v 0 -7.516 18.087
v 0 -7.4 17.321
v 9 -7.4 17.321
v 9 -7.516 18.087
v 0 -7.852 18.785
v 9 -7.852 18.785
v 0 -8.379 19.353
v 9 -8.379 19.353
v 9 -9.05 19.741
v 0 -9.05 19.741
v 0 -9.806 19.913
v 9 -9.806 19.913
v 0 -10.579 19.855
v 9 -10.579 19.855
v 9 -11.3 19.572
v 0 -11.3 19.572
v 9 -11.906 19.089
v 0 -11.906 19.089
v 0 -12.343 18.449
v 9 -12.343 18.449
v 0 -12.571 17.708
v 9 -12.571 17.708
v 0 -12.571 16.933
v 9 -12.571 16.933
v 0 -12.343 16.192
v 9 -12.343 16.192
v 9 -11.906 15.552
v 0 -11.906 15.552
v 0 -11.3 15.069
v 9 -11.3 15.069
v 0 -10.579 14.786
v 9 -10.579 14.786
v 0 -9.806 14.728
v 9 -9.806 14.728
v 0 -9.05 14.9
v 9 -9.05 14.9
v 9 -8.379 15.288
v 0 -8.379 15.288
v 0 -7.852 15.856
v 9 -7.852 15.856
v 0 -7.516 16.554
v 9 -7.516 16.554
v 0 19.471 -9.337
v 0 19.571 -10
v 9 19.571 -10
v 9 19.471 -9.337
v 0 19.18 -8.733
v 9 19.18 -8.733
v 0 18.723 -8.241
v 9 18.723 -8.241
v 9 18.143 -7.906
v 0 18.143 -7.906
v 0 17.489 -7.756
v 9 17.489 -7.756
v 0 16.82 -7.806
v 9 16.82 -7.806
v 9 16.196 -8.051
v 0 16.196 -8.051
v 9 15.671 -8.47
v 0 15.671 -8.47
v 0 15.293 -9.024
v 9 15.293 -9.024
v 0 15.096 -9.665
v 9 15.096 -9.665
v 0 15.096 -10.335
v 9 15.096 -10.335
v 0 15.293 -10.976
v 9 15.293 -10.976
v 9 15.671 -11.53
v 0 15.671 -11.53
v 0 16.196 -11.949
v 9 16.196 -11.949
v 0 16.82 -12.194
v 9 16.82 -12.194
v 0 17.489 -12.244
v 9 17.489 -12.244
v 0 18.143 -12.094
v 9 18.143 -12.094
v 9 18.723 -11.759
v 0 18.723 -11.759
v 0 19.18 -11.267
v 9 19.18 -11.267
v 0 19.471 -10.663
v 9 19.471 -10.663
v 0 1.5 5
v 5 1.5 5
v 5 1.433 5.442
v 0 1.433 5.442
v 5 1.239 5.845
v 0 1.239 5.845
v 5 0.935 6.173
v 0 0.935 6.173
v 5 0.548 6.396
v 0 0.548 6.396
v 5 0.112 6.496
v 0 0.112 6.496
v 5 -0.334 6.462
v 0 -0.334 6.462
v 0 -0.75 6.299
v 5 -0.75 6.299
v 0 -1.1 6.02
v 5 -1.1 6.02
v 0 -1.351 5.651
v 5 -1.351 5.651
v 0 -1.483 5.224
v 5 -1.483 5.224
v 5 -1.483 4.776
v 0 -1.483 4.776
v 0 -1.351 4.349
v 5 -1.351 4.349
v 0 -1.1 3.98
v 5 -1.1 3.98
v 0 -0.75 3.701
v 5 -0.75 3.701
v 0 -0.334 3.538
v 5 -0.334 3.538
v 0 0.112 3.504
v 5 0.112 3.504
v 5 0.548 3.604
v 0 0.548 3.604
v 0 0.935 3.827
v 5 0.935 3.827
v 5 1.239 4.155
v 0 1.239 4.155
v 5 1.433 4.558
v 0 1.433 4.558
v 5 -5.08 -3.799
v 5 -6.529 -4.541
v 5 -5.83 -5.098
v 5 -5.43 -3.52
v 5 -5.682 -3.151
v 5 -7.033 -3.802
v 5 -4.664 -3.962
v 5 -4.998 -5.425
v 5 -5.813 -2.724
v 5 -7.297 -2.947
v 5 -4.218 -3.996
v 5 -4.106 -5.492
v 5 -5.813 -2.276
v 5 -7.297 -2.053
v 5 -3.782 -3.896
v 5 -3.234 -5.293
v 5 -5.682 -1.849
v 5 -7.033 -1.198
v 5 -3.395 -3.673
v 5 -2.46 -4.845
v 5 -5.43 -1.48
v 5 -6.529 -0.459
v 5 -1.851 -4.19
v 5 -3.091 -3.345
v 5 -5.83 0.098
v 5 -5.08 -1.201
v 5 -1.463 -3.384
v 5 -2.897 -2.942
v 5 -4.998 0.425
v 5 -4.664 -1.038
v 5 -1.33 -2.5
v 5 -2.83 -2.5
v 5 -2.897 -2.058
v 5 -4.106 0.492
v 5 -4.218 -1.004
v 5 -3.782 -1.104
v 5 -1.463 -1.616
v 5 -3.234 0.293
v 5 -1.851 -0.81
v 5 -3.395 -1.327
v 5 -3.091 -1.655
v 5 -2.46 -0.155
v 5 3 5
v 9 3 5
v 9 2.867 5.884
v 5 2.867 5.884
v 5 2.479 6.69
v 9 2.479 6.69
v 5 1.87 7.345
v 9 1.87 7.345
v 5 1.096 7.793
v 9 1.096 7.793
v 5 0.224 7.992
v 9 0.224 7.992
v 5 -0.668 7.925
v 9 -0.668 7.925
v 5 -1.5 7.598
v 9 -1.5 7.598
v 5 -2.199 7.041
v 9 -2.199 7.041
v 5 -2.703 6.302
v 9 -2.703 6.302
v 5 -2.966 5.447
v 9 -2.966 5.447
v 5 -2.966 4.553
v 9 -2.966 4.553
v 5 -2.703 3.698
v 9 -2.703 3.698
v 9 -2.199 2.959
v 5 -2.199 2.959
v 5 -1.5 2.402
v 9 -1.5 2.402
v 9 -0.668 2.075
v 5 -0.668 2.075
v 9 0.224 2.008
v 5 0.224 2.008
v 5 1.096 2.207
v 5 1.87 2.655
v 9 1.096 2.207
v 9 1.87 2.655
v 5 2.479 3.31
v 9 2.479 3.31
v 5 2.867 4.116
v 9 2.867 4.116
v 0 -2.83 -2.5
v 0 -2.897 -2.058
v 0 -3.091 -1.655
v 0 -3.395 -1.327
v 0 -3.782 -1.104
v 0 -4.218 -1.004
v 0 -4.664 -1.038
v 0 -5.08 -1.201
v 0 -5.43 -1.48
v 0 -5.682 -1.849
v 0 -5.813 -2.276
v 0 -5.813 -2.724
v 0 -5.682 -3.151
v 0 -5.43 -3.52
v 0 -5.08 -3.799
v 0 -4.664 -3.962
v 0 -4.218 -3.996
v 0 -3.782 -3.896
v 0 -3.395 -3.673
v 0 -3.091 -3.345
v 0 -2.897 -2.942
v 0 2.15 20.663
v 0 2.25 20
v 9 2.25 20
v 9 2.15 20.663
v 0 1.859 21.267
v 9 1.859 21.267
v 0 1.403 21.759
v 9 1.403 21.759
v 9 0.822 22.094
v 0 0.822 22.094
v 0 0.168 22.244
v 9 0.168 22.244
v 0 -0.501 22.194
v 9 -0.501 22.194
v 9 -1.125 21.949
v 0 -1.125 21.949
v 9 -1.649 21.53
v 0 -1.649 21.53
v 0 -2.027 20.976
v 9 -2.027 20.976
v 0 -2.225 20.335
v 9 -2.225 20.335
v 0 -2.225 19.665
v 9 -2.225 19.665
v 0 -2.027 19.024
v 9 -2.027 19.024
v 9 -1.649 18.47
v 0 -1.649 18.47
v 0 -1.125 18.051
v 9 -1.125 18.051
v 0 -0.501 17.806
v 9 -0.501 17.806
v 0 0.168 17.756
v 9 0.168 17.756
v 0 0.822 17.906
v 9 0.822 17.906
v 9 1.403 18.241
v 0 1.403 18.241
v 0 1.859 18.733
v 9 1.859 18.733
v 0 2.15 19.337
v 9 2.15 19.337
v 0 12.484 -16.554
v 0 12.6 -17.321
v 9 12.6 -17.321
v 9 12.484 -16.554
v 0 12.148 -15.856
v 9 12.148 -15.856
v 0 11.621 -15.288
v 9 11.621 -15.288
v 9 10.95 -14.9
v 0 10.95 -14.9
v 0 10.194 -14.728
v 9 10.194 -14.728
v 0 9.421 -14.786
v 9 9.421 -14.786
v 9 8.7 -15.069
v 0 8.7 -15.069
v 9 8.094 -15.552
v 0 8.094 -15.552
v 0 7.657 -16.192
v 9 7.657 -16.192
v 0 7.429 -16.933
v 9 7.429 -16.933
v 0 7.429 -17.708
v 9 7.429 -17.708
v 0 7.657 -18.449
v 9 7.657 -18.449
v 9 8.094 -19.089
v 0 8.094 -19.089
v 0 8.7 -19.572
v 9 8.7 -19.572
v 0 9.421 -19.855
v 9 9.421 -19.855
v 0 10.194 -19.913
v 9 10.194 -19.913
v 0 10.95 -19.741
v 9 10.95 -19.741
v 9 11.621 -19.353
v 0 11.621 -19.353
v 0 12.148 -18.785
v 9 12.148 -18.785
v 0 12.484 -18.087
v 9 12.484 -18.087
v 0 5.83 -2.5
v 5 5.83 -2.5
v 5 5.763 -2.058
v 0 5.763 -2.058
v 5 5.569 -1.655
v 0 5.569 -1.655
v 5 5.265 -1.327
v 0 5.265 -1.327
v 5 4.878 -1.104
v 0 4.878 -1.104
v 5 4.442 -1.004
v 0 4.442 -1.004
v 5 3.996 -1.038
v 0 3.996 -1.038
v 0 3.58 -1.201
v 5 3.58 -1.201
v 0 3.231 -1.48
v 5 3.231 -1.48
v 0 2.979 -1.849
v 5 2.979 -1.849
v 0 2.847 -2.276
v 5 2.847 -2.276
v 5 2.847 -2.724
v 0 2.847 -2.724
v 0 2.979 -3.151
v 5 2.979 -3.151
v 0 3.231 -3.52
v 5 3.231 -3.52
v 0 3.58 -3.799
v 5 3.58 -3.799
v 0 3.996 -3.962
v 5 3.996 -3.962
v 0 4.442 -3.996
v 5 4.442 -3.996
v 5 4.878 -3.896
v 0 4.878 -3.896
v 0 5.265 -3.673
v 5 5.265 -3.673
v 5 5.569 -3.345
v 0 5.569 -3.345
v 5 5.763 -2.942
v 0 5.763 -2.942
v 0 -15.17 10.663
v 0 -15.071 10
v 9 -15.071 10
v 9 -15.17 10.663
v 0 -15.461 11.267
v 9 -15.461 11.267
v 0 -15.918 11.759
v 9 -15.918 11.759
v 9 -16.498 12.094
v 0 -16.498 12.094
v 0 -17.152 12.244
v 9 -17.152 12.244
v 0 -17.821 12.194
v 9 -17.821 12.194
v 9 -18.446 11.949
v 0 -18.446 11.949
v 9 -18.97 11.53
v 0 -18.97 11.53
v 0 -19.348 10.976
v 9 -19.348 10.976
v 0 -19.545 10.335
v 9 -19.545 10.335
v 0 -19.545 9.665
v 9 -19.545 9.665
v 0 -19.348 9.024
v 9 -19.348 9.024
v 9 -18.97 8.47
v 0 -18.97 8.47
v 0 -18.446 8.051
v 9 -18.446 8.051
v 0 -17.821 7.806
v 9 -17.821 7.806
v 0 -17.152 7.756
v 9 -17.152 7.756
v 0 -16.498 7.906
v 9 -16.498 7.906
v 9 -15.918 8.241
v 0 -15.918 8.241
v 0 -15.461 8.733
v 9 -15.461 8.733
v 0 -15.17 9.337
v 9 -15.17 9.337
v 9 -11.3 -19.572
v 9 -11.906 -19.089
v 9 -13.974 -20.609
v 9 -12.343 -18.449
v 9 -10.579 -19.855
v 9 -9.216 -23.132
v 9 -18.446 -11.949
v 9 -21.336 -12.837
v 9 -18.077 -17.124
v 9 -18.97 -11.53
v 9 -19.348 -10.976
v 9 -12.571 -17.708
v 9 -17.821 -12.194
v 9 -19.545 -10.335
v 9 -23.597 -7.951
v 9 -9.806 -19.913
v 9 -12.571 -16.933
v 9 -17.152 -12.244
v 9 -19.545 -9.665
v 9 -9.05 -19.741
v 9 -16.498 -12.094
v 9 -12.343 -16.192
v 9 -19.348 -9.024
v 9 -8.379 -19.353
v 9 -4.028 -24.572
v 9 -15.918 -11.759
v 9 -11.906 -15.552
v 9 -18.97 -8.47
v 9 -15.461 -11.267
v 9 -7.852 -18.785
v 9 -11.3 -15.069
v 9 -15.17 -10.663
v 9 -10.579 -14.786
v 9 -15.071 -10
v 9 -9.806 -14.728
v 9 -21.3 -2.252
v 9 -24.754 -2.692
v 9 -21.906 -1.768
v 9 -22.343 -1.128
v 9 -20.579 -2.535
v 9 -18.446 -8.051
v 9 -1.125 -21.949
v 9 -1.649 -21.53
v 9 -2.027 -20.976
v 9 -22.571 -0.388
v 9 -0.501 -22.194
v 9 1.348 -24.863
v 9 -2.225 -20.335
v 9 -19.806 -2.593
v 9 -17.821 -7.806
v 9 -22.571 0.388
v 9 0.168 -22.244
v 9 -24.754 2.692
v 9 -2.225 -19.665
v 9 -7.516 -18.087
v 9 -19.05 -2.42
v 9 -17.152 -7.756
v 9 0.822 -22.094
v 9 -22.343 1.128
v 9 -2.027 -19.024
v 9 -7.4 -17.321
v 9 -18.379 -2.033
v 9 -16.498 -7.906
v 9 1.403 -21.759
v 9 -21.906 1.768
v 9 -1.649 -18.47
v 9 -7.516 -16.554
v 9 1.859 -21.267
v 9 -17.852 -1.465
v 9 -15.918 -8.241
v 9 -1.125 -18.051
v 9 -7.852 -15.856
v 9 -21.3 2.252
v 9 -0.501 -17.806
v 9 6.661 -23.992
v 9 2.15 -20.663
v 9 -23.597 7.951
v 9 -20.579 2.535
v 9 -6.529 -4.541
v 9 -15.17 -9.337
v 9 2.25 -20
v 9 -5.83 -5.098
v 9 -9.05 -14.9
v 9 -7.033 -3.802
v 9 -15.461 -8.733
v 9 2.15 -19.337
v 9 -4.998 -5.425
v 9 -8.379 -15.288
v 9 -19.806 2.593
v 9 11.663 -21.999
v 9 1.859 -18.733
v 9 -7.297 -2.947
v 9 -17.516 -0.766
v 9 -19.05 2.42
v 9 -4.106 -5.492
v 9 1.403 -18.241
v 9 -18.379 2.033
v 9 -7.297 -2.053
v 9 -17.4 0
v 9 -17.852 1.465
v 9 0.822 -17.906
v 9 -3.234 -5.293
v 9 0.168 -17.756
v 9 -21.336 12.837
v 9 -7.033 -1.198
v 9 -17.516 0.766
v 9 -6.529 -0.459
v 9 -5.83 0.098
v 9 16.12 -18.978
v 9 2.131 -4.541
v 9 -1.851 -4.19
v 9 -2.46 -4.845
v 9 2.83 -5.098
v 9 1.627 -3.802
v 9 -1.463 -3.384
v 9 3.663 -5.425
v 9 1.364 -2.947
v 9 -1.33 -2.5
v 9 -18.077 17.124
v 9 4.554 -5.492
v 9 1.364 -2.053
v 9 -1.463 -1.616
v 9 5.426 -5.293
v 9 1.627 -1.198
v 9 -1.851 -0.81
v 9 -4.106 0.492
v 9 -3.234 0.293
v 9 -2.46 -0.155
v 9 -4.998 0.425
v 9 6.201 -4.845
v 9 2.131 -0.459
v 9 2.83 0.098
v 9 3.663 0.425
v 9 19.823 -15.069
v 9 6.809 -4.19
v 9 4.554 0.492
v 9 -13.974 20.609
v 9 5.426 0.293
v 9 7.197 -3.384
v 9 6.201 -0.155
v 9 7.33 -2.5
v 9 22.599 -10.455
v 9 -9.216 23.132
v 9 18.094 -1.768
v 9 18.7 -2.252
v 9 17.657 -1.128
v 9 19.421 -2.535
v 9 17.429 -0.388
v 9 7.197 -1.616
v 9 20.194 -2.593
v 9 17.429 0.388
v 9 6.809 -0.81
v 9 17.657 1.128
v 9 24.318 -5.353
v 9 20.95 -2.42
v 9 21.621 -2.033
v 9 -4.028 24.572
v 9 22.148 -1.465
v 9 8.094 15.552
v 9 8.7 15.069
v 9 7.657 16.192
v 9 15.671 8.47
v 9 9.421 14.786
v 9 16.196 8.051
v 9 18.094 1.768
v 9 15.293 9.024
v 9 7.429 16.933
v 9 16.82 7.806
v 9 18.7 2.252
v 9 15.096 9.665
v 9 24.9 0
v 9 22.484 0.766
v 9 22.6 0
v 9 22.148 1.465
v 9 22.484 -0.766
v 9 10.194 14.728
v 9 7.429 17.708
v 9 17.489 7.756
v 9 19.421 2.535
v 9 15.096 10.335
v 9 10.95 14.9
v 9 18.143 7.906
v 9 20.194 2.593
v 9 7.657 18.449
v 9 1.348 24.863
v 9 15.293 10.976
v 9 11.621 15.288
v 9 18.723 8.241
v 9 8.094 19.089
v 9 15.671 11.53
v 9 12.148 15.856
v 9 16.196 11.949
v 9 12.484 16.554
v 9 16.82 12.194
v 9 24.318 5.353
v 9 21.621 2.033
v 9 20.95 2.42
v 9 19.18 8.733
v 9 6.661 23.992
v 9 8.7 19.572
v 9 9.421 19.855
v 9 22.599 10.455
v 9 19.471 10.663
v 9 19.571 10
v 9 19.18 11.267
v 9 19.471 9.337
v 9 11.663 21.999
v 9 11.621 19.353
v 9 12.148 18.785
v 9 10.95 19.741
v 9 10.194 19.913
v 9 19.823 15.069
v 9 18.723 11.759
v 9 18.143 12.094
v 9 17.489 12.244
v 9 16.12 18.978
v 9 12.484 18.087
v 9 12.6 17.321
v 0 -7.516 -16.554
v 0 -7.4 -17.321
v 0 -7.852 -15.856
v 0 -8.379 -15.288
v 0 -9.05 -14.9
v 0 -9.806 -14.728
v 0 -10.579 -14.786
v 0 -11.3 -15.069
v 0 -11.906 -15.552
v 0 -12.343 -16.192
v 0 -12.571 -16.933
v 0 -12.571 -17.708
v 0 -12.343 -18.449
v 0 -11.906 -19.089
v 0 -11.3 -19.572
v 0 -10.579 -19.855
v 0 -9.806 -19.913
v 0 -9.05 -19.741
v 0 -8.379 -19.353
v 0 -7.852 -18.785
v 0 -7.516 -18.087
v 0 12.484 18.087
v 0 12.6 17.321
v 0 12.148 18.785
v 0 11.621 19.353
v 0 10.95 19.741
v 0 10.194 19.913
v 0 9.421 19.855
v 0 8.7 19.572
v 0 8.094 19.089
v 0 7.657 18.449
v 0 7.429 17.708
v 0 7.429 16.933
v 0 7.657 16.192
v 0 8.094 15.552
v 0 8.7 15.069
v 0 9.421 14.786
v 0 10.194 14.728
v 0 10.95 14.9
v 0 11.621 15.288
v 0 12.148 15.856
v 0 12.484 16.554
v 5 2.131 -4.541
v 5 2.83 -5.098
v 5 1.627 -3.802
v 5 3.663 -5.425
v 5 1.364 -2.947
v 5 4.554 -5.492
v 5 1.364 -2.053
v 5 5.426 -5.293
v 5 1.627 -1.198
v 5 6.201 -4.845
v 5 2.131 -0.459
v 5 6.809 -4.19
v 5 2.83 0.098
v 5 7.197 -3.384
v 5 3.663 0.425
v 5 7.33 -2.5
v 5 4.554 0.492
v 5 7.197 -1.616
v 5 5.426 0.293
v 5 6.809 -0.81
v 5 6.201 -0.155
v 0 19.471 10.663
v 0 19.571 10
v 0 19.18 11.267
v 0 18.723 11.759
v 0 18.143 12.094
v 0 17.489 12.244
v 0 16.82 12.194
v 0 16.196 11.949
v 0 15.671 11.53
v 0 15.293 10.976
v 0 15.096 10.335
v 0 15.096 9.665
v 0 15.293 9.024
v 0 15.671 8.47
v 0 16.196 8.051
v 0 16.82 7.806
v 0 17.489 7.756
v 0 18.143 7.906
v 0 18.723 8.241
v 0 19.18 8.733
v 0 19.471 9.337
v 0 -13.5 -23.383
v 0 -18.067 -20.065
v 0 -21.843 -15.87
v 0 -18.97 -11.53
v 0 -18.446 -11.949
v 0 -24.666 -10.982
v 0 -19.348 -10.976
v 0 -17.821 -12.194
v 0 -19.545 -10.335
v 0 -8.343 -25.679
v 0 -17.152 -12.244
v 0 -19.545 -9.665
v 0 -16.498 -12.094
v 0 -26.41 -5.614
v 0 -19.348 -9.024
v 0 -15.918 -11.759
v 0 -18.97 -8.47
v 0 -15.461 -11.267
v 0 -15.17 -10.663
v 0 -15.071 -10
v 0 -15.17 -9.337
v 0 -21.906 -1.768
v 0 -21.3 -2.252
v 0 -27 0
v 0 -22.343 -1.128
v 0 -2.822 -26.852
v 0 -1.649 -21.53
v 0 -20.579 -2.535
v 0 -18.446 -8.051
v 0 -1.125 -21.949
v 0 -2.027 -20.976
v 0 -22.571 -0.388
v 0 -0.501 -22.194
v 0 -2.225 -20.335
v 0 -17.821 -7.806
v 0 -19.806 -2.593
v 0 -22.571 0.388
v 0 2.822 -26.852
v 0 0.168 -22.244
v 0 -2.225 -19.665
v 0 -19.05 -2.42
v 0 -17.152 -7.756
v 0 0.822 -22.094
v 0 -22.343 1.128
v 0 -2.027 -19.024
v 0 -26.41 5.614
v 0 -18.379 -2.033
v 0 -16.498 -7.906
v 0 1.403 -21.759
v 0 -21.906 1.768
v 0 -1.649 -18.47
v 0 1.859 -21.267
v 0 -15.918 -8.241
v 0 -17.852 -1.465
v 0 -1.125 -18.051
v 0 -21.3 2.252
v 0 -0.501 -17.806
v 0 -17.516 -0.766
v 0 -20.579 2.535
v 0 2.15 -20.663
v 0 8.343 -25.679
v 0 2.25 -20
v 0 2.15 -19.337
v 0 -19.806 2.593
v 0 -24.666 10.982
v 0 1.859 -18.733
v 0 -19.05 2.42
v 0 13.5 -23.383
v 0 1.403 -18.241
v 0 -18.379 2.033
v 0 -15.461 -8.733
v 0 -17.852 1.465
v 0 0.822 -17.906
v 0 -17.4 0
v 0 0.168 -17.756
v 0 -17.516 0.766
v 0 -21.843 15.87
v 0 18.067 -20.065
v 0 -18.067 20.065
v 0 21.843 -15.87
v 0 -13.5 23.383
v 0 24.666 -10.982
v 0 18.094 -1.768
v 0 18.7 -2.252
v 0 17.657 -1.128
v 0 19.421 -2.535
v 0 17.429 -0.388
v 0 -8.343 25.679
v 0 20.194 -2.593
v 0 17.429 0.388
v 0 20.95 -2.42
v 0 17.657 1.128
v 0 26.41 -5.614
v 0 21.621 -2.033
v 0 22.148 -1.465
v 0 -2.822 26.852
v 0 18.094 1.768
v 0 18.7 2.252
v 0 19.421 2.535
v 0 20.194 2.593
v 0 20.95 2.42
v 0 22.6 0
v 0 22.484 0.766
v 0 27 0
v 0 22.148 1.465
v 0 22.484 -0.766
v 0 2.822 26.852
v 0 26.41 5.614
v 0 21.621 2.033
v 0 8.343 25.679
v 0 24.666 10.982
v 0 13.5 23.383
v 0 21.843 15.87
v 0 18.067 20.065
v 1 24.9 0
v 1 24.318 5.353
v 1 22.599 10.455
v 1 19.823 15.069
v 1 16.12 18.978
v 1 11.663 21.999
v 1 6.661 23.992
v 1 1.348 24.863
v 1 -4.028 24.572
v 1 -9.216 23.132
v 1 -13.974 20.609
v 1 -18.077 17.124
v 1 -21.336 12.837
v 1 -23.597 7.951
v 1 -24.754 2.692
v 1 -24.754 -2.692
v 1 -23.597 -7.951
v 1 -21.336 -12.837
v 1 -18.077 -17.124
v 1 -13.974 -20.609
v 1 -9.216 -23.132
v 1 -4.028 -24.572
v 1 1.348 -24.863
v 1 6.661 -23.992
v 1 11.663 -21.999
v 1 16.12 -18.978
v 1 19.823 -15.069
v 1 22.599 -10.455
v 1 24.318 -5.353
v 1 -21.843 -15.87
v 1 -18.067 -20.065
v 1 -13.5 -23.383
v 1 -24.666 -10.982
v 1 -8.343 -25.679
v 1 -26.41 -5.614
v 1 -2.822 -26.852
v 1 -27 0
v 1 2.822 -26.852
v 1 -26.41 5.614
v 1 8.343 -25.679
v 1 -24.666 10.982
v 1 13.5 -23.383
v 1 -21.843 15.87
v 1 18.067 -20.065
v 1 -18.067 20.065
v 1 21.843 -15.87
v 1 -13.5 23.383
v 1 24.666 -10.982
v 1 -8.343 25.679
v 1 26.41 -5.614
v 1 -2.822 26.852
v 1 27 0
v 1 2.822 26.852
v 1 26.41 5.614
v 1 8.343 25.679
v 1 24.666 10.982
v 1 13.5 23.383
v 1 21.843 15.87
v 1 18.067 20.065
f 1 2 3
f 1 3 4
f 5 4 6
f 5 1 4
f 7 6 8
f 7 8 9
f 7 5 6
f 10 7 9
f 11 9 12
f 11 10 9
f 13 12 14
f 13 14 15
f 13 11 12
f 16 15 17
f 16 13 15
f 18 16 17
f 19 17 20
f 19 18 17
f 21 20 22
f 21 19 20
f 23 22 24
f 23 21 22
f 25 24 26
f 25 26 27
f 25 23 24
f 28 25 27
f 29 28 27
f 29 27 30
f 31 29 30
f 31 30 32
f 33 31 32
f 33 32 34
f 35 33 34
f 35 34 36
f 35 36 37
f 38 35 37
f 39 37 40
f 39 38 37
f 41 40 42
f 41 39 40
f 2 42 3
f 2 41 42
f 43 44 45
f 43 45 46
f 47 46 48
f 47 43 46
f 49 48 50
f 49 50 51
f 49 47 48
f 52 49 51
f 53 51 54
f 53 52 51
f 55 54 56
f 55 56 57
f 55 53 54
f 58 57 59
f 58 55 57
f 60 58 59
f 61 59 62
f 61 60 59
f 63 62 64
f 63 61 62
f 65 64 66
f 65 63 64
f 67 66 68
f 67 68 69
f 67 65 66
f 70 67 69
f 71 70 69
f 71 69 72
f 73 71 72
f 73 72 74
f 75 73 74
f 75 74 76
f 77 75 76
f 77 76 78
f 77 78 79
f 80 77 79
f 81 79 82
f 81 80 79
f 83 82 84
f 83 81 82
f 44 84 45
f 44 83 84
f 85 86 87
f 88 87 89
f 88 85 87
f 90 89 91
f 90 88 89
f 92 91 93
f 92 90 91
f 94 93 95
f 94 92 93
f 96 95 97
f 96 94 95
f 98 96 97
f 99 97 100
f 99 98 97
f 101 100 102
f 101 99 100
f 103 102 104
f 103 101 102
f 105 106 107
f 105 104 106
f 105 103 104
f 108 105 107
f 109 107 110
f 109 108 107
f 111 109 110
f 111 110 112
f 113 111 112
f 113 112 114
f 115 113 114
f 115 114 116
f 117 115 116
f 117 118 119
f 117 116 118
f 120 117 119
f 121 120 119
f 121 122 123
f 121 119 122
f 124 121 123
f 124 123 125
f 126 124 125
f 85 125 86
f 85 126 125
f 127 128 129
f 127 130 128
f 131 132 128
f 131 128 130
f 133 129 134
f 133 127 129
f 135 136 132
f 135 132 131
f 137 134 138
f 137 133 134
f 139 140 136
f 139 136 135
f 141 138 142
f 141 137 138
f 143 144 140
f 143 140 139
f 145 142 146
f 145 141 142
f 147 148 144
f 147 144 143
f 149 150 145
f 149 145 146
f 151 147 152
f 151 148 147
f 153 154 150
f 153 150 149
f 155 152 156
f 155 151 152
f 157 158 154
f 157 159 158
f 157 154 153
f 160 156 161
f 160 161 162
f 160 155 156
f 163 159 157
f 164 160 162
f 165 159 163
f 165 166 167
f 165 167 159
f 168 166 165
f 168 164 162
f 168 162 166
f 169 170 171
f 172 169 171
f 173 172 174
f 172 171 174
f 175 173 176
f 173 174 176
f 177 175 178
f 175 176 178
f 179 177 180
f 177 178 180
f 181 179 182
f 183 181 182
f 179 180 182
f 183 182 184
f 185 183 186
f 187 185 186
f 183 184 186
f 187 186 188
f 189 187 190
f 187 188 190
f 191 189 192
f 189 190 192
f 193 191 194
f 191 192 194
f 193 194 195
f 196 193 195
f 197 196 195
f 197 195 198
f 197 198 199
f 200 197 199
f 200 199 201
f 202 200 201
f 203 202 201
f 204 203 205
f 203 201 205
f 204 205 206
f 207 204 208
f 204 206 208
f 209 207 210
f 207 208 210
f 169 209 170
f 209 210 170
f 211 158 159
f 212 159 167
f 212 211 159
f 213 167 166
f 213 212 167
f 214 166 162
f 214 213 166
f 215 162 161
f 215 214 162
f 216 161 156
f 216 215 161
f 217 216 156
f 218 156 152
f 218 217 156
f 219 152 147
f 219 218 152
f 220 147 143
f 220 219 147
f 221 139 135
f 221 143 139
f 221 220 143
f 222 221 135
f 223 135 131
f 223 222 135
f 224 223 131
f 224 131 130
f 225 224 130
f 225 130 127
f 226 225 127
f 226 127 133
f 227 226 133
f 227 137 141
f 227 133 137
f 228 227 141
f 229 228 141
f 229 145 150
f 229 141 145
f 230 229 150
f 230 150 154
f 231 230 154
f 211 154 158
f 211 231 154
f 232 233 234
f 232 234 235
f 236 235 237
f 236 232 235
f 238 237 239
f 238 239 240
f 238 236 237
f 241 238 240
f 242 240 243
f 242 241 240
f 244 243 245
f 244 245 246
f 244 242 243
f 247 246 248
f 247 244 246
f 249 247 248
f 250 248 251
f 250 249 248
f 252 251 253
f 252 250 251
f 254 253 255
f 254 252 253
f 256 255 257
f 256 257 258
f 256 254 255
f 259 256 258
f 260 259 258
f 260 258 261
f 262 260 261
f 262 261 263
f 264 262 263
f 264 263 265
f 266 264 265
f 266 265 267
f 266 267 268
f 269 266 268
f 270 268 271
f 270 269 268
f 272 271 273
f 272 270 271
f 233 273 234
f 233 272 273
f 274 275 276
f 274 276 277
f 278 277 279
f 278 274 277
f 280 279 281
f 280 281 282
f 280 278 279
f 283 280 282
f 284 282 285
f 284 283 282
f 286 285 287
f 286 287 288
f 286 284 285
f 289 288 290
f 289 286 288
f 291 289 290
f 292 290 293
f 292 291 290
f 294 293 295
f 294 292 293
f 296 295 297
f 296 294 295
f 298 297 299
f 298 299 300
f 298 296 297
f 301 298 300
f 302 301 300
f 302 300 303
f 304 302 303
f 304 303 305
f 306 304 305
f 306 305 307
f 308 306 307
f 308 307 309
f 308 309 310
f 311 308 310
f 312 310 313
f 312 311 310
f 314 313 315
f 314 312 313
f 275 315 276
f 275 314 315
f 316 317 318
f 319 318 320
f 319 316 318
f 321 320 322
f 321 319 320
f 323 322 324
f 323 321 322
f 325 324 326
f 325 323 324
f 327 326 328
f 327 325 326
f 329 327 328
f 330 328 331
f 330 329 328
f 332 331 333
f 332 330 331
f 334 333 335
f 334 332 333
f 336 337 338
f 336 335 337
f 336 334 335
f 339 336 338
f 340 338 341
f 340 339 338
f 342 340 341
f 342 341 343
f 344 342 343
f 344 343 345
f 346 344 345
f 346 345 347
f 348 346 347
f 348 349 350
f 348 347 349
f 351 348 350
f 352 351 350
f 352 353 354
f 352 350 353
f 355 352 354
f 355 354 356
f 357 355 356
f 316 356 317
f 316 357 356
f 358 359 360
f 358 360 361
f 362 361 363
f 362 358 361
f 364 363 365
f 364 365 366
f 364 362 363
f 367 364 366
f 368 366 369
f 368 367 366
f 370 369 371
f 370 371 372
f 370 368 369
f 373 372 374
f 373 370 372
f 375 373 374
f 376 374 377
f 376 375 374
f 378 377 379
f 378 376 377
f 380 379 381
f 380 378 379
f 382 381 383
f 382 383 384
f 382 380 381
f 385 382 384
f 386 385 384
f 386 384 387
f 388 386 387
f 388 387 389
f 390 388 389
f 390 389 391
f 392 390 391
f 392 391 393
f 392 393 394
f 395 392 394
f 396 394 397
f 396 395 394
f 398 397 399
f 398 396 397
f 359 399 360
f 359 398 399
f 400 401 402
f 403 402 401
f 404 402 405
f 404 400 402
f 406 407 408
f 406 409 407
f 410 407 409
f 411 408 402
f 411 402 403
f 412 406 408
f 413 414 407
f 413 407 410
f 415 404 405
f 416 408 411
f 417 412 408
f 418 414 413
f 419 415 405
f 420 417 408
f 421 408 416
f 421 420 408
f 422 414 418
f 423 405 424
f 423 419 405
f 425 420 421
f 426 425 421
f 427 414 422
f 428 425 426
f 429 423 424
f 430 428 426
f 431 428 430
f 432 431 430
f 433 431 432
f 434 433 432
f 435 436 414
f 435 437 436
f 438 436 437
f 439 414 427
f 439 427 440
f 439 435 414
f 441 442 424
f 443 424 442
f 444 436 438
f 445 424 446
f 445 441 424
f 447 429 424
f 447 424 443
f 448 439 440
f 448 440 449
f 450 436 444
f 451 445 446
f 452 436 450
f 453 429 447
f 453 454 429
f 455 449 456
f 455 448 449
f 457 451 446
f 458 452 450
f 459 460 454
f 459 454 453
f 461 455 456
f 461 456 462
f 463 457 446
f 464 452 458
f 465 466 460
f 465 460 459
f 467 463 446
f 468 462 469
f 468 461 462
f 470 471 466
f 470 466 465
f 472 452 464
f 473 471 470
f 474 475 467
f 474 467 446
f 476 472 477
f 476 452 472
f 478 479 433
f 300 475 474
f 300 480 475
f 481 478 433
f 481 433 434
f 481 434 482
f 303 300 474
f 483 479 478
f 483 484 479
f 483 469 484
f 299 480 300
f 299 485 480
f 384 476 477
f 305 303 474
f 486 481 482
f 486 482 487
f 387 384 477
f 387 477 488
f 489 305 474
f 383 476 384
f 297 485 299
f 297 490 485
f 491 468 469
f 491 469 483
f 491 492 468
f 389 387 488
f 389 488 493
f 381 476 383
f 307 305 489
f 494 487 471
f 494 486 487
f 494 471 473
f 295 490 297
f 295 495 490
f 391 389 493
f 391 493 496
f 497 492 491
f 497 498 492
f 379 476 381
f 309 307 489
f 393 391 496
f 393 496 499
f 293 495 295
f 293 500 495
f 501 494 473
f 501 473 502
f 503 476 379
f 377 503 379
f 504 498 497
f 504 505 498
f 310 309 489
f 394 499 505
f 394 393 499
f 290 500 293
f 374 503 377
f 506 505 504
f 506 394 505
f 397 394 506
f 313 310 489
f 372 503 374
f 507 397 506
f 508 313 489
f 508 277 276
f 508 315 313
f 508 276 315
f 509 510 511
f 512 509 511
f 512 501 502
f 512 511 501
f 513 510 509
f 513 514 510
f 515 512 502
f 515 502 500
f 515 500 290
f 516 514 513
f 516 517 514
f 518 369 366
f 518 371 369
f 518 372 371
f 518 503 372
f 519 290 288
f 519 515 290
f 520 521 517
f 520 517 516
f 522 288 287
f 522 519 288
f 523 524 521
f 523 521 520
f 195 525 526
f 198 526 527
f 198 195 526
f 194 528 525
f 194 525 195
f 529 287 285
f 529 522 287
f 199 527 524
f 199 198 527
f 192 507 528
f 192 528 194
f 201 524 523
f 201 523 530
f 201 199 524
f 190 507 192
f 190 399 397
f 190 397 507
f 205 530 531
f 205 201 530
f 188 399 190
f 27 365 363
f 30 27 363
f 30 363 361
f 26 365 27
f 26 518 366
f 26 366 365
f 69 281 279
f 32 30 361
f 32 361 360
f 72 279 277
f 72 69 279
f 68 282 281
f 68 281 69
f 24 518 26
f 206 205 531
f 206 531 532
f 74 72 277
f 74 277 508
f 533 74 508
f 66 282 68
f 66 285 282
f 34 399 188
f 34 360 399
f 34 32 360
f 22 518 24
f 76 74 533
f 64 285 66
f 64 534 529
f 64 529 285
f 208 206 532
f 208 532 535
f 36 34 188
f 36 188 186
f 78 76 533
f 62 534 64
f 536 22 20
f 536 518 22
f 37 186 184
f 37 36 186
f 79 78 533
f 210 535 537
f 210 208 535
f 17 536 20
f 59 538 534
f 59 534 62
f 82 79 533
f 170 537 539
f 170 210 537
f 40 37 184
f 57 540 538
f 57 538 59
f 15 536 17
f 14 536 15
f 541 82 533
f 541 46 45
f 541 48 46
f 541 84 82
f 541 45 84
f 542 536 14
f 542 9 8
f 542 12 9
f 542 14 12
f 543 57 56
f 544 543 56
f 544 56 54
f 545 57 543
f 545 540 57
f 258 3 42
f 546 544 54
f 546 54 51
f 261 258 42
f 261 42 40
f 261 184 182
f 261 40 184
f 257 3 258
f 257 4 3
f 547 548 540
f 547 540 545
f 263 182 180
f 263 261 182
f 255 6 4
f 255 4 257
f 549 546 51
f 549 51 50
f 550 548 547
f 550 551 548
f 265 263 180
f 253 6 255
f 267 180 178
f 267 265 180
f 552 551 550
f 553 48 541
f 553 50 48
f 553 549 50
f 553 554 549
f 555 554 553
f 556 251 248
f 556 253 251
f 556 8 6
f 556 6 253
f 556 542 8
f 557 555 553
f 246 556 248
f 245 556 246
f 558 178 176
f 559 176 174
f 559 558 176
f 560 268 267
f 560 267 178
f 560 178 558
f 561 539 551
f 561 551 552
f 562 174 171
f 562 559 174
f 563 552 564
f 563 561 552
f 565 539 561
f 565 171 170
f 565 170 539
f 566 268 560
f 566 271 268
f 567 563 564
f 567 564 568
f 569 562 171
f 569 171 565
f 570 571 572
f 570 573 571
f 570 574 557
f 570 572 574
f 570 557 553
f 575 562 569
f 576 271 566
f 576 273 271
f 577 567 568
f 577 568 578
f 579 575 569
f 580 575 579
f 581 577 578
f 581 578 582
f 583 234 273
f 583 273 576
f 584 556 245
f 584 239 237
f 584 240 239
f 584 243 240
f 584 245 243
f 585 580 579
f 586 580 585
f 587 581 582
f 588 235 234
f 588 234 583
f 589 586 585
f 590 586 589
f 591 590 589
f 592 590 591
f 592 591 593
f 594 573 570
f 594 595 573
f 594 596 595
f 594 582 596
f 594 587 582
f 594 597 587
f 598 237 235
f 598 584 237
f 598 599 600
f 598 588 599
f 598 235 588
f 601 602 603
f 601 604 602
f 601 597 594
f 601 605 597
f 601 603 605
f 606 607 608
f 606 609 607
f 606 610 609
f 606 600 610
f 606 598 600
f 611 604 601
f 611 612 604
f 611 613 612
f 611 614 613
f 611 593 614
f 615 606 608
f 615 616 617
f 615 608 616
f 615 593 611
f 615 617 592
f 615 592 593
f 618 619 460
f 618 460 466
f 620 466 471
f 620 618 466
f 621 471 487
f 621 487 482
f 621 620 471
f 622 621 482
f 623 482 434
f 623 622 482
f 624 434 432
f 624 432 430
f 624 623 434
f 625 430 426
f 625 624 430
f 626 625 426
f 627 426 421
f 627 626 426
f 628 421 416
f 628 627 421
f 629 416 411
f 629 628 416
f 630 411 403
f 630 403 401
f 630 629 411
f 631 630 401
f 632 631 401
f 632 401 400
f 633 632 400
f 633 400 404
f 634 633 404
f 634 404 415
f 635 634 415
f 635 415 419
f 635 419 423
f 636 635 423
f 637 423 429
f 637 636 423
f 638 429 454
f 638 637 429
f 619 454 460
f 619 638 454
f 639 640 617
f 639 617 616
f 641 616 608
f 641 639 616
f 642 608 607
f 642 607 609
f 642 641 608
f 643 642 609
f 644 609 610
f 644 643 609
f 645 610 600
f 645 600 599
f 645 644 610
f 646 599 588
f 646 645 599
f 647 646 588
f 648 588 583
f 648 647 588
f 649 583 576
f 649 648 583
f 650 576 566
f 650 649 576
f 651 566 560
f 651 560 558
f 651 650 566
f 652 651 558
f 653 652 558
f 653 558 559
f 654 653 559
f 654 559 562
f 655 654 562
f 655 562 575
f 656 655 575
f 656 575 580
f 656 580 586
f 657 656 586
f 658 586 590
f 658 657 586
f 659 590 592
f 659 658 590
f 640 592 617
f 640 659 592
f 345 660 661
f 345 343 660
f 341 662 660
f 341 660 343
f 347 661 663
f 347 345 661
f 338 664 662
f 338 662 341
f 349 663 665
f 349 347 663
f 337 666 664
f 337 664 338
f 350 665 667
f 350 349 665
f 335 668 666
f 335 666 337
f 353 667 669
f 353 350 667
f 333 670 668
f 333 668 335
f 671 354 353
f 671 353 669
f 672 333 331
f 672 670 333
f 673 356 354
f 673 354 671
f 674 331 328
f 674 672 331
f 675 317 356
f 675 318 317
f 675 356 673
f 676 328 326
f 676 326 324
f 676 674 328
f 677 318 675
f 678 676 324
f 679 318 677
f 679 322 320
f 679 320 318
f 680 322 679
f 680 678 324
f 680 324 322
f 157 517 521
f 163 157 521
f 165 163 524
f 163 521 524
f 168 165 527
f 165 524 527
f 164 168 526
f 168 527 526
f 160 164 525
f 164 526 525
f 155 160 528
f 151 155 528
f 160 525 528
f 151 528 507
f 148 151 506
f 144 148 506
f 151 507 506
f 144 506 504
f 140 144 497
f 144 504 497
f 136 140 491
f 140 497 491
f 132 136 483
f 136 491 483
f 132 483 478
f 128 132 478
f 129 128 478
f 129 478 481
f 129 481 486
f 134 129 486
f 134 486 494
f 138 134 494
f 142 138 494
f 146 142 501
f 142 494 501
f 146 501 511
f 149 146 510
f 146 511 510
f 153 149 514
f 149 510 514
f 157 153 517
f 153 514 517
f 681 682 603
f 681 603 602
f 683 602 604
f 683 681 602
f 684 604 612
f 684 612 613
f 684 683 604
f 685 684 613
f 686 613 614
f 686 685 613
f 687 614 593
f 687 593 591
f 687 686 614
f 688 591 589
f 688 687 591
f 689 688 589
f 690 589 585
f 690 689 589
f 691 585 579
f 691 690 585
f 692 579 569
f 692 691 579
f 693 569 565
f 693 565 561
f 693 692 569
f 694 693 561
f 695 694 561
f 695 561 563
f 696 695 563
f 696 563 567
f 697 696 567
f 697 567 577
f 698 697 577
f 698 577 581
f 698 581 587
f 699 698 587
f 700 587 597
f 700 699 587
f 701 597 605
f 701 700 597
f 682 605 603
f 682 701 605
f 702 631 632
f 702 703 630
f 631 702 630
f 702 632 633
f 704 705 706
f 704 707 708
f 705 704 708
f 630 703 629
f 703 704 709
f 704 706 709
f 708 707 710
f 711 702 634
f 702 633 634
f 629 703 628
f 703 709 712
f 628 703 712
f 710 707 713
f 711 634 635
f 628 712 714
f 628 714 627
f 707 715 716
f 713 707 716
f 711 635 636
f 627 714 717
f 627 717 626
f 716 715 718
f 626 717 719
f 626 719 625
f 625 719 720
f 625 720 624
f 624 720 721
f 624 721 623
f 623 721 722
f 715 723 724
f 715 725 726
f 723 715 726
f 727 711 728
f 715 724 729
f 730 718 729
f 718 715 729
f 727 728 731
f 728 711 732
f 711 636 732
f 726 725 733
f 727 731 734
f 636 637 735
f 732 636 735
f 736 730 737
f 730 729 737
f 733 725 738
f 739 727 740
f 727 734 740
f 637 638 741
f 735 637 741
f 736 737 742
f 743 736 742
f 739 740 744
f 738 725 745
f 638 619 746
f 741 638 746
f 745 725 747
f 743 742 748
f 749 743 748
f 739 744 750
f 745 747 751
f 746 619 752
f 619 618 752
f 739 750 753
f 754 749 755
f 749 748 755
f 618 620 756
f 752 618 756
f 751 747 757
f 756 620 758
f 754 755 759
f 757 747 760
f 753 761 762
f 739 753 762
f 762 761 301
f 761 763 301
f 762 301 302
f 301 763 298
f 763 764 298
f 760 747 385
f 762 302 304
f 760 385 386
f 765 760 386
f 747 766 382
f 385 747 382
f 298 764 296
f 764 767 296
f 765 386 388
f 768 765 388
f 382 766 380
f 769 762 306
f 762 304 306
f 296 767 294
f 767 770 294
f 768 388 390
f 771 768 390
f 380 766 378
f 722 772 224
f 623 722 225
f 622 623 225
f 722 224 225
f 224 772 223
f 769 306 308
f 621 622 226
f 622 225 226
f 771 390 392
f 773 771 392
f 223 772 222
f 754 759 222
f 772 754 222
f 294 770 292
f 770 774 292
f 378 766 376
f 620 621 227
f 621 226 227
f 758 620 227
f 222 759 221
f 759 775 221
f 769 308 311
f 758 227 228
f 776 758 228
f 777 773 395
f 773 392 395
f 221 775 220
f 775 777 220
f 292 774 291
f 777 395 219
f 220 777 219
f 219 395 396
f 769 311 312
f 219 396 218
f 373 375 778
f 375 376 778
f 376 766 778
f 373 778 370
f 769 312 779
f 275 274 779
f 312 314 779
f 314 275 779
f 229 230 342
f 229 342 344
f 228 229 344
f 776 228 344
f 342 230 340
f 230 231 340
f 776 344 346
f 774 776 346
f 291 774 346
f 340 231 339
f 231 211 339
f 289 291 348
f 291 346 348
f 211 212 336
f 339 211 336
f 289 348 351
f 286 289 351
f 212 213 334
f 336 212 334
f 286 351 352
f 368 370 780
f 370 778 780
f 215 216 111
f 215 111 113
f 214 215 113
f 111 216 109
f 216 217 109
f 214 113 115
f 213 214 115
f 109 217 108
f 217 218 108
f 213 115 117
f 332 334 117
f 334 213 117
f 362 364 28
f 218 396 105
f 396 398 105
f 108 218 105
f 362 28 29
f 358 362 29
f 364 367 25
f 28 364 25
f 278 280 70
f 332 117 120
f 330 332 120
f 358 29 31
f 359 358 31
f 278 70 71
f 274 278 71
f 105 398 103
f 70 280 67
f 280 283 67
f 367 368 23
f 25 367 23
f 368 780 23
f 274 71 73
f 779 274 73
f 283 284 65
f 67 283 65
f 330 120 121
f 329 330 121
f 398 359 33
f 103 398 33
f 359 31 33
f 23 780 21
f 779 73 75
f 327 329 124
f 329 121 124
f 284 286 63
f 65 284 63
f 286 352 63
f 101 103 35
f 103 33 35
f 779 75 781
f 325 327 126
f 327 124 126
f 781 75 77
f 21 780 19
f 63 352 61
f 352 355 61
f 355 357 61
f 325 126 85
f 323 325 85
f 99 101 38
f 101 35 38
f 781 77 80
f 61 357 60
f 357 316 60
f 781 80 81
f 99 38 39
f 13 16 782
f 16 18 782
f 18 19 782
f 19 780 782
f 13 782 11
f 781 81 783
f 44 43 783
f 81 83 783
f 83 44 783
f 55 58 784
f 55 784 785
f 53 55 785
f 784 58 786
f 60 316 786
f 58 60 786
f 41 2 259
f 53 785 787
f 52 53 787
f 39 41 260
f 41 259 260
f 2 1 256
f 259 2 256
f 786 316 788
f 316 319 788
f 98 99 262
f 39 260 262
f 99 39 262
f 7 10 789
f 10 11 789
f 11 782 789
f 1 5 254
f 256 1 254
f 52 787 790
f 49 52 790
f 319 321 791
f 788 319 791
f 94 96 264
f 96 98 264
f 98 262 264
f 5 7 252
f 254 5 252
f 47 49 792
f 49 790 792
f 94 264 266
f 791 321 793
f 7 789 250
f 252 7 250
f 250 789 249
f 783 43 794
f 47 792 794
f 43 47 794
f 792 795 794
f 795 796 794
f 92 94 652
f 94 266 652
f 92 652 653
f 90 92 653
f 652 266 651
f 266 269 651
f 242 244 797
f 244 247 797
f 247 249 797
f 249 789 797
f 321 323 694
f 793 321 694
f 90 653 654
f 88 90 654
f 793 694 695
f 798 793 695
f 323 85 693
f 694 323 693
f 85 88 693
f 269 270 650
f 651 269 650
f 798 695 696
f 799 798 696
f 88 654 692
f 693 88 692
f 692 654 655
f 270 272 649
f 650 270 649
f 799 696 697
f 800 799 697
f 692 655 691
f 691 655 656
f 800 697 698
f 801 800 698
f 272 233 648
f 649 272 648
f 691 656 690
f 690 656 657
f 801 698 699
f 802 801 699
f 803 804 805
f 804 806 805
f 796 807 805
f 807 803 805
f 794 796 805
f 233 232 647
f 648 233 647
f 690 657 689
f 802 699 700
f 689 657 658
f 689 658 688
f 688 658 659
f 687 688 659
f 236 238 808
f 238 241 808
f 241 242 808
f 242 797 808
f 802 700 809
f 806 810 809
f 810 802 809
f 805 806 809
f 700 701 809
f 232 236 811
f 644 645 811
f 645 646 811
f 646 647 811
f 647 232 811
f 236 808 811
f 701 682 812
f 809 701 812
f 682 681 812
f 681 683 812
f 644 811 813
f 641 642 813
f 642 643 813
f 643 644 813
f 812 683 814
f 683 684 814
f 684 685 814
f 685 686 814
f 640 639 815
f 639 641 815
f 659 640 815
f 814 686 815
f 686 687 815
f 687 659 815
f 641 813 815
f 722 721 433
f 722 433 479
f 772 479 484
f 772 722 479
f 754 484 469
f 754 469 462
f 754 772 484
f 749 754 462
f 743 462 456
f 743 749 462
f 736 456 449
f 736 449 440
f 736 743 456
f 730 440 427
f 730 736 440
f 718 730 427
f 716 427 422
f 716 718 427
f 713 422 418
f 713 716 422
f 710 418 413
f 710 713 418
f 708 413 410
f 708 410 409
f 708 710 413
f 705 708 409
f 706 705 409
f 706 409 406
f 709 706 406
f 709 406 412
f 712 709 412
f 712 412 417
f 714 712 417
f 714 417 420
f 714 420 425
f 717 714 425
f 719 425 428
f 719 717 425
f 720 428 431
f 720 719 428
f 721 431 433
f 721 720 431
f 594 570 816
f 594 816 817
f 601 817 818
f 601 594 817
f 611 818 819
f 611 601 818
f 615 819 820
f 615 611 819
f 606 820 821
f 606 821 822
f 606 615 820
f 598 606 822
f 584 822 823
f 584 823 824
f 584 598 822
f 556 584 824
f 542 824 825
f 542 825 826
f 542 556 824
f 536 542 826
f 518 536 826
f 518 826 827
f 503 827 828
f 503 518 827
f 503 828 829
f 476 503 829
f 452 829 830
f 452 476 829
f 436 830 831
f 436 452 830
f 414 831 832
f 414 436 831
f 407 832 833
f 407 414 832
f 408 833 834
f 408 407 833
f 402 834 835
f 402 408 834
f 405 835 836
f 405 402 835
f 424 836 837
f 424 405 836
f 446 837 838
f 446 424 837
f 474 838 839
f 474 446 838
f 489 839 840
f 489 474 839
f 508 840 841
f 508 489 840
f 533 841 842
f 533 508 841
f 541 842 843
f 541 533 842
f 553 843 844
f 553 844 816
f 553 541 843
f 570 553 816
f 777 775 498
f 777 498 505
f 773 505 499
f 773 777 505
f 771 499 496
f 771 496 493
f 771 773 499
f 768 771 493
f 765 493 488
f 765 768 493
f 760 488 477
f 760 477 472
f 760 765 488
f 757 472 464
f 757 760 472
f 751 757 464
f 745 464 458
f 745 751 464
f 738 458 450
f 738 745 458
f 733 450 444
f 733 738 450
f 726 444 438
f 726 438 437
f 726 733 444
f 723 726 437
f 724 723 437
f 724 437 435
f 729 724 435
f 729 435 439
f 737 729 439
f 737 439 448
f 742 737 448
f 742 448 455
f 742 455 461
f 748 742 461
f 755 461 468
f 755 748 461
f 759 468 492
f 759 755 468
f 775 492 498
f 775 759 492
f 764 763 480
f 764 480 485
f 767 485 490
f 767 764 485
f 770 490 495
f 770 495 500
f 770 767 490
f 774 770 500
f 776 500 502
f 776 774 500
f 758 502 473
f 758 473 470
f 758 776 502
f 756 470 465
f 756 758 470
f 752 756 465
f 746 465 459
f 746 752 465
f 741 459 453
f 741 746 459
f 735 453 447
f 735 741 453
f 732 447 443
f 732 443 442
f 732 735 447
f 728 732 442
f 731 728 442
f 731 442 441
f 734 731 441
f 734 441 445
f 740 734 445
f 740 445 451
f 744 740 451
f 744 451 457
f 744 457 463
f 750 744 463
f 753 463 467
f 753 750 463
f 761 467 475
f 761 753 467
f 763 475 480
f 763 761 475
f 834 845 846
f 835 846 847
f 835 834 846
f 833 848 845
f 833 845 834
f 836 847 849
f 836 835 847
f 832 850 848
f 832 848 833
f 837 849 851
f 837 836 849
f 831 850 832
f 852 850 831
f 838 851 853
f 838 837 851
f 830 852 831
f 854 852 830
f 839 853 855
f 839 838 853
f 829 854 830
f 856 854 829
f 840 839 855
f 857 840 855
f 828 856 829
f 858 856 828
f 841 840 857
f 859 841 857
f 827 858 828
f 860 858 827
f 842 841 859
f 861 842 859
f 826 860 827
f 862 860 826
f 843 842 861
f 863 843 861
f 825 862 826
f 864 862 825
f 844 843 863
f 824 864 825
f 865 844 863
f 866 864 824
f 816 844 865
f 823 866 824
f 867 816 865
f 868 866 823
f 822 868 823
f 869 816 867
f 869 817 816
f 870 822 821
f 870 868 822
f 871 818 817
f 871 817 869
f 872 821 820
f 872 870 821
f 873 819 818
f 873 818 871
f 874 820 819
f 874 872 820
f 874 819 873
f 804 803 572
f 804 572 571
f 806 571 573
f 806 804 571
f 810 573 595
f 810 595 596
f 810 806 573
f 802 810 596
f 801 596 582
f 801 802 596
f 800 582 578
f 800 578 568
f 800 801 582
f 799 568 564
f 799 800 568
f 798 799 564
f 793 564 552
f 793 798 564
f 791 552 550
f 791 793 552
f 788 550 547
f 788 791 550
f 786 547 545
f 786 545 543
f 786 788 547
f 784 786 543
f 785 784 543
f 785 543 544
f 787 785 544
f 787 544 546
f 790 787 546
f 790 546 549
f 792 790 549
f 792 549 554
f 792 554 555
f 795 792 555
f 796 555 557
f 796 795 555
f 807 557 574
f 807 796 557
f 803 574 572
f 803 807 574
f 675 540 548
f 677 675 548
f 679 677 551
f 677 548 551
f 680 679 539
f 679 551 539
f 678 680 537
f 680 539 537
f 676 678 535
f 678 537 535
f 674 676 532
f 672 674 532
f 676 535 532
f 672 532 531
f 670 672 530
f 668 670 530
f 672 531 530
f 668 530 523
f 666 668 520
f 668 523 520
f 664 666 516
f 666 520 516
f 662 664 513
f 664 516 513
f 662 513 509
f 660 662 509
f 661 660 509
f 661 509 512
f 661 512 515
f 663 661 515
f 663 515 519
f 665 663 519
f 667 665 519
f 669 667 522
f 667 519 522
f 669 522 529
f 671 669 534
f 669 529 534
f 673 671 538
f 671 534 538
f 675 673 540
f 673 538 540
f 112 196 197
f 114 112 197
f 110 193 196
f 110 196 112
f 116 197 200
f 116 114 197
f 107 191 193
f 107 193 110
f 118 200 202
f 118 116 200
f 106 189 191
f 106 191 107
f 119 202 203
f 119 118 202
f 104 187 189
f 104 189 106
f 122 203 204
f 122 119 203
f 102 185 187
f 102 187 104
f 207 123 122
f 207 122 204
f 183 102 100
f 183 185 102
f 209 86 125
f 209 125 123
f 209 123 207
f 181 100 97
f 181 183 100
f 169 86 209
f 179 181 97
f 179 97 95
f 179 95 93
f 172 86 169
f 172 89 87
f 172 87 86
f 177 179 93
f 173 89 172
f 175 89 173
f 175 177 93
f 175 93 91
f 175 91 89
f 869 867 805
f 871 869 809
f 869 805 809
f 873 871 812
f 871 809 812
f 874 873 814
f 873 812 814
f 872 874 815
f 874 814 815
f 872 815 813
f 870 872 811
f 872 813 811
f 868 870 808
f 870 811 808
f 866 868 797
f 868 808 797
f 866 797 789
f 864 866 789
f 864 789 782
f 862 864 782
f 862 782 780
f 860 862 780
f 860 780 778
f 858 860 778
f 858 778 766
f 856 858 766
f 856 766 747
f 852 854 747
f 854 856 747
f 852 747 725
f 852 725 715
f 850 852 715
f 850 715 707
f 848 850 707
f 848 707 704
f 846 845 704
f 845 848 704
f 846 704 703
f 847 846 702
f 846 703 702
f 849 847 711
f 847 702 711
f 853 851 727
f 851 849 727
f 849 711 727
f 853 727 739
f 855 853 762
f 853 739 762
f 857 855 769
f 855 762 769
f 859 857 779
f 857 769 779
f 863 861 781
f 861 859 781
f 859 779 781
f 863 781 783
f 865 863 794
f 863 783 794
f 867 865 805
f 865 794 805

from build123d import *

# Parameters (mm, degrees)
SKETCH020_R     = 27
SKETCH020_R_2   = 1.5
SKETCH020_R_3   = 2.25
SKETCH020_R_4   = 2.6
PAD017_DEPTH    = 9
SKETCH021_R     = 30
SKETCH021_R_2   = 24.9
POCKET003_DEPTH = 8
SKETCH022_R     = 3
POCKET004_DEPTH = 4


with BuildPart() as part:
    # Sketch020 → Pad017 (new body)
    with BuildSketch(Plane.YZ):
        Circle(SKETCH020_R)
        with Locations((0, 5)):
            Circle(SKETCH020_R_2, mode=Mode.SUBTRACT)
        with Locations((-4.330127, -2.5)):
            Circle(SKETCH020_R_2, mode=Mode.SUBTRACT)
        with Locations((4.330127, -2.5)):
            Circle(SKETCH020_R_2, mode=Mode.SUBTRACT)
        with Locations((0, 20)):
            Circle(SKETCH020_R_3, mode=Mode.SUBTRACT)
        with Locations((0, -20)):
            Circle(SKETCH020_R_3, mode=Mode.SUBTRACT)
        with Locations((17.320508, -10)):
            Circle(SKETCH020_R_3, mode=Mode.SUBTRACT)
        with Locations((-17.320508, -10)):
            Circle(SKETCH020_R_3, mode=Mode.SUBTRACT)
        with Locations((-17.320508, 10)):
            Circle(SKETCH020_R_3, mode=Mode.SUBTRACT)
        with Locations((17.320508, 10)):
            Circle(SKETCH020_R_3, mode=Mode.SUBTRACT)
        with Locations((20, 0)):
            Circle(SKETCH020_R_4, mode=Mode.SUBTRACT)
        with Locations((-20, 0)):
            Circle(SKETCH020_R_4, mode=Mode.SUBTRACT)
        with Locations((-10, -17.320508)):
            Circle(SKETCH020_R_4, mode=Mode.SUBTRACT)
        with Locations((10, -17.320508)):
            Circle(SKETCH020_R_4, mode=Mode.SUBTRACT)
        with Locations((10, 17.320508)):
            Circle(SKETCH020_R_4, mode=Mode.SUBTRACT)
        with Locations((-10, 17.320508)):
            Circle(SKETCH020_R_4, mode=Mode.SUBTRACT)
    extrude(amount=PAD017_DEPTH)

    # Sketch021 (on DatumPlane) → Pocket003 (cut)
    with BuildSketch(Plane.YZ.offset(9)):
        Circle(SKETCH021_R)
        Circle(SKETCH021_R_2, mode=Mode.SUBTRACT)
    extrude(amount=-POCKET003_DEPTH, mode=Mode.SUBTRACT)

    # Sketch022 (on DatumPlane) → Pocket004 (cut)
    with BuildSketch(Plane.YZ.offset(9)):
        with Locations((0, 5)):
            Circle(SKETCH022_R)
        with Locations((4.330127, -2.5)):
            Circle(SKETCH022_R)
        with Locations((-4.330127, -2.5)):
            Circle(SKETCH022_R)
    extrude(amount=-POCKET004_DEPTH, mode=Mode.SUBTRACT)


solid = part.part
